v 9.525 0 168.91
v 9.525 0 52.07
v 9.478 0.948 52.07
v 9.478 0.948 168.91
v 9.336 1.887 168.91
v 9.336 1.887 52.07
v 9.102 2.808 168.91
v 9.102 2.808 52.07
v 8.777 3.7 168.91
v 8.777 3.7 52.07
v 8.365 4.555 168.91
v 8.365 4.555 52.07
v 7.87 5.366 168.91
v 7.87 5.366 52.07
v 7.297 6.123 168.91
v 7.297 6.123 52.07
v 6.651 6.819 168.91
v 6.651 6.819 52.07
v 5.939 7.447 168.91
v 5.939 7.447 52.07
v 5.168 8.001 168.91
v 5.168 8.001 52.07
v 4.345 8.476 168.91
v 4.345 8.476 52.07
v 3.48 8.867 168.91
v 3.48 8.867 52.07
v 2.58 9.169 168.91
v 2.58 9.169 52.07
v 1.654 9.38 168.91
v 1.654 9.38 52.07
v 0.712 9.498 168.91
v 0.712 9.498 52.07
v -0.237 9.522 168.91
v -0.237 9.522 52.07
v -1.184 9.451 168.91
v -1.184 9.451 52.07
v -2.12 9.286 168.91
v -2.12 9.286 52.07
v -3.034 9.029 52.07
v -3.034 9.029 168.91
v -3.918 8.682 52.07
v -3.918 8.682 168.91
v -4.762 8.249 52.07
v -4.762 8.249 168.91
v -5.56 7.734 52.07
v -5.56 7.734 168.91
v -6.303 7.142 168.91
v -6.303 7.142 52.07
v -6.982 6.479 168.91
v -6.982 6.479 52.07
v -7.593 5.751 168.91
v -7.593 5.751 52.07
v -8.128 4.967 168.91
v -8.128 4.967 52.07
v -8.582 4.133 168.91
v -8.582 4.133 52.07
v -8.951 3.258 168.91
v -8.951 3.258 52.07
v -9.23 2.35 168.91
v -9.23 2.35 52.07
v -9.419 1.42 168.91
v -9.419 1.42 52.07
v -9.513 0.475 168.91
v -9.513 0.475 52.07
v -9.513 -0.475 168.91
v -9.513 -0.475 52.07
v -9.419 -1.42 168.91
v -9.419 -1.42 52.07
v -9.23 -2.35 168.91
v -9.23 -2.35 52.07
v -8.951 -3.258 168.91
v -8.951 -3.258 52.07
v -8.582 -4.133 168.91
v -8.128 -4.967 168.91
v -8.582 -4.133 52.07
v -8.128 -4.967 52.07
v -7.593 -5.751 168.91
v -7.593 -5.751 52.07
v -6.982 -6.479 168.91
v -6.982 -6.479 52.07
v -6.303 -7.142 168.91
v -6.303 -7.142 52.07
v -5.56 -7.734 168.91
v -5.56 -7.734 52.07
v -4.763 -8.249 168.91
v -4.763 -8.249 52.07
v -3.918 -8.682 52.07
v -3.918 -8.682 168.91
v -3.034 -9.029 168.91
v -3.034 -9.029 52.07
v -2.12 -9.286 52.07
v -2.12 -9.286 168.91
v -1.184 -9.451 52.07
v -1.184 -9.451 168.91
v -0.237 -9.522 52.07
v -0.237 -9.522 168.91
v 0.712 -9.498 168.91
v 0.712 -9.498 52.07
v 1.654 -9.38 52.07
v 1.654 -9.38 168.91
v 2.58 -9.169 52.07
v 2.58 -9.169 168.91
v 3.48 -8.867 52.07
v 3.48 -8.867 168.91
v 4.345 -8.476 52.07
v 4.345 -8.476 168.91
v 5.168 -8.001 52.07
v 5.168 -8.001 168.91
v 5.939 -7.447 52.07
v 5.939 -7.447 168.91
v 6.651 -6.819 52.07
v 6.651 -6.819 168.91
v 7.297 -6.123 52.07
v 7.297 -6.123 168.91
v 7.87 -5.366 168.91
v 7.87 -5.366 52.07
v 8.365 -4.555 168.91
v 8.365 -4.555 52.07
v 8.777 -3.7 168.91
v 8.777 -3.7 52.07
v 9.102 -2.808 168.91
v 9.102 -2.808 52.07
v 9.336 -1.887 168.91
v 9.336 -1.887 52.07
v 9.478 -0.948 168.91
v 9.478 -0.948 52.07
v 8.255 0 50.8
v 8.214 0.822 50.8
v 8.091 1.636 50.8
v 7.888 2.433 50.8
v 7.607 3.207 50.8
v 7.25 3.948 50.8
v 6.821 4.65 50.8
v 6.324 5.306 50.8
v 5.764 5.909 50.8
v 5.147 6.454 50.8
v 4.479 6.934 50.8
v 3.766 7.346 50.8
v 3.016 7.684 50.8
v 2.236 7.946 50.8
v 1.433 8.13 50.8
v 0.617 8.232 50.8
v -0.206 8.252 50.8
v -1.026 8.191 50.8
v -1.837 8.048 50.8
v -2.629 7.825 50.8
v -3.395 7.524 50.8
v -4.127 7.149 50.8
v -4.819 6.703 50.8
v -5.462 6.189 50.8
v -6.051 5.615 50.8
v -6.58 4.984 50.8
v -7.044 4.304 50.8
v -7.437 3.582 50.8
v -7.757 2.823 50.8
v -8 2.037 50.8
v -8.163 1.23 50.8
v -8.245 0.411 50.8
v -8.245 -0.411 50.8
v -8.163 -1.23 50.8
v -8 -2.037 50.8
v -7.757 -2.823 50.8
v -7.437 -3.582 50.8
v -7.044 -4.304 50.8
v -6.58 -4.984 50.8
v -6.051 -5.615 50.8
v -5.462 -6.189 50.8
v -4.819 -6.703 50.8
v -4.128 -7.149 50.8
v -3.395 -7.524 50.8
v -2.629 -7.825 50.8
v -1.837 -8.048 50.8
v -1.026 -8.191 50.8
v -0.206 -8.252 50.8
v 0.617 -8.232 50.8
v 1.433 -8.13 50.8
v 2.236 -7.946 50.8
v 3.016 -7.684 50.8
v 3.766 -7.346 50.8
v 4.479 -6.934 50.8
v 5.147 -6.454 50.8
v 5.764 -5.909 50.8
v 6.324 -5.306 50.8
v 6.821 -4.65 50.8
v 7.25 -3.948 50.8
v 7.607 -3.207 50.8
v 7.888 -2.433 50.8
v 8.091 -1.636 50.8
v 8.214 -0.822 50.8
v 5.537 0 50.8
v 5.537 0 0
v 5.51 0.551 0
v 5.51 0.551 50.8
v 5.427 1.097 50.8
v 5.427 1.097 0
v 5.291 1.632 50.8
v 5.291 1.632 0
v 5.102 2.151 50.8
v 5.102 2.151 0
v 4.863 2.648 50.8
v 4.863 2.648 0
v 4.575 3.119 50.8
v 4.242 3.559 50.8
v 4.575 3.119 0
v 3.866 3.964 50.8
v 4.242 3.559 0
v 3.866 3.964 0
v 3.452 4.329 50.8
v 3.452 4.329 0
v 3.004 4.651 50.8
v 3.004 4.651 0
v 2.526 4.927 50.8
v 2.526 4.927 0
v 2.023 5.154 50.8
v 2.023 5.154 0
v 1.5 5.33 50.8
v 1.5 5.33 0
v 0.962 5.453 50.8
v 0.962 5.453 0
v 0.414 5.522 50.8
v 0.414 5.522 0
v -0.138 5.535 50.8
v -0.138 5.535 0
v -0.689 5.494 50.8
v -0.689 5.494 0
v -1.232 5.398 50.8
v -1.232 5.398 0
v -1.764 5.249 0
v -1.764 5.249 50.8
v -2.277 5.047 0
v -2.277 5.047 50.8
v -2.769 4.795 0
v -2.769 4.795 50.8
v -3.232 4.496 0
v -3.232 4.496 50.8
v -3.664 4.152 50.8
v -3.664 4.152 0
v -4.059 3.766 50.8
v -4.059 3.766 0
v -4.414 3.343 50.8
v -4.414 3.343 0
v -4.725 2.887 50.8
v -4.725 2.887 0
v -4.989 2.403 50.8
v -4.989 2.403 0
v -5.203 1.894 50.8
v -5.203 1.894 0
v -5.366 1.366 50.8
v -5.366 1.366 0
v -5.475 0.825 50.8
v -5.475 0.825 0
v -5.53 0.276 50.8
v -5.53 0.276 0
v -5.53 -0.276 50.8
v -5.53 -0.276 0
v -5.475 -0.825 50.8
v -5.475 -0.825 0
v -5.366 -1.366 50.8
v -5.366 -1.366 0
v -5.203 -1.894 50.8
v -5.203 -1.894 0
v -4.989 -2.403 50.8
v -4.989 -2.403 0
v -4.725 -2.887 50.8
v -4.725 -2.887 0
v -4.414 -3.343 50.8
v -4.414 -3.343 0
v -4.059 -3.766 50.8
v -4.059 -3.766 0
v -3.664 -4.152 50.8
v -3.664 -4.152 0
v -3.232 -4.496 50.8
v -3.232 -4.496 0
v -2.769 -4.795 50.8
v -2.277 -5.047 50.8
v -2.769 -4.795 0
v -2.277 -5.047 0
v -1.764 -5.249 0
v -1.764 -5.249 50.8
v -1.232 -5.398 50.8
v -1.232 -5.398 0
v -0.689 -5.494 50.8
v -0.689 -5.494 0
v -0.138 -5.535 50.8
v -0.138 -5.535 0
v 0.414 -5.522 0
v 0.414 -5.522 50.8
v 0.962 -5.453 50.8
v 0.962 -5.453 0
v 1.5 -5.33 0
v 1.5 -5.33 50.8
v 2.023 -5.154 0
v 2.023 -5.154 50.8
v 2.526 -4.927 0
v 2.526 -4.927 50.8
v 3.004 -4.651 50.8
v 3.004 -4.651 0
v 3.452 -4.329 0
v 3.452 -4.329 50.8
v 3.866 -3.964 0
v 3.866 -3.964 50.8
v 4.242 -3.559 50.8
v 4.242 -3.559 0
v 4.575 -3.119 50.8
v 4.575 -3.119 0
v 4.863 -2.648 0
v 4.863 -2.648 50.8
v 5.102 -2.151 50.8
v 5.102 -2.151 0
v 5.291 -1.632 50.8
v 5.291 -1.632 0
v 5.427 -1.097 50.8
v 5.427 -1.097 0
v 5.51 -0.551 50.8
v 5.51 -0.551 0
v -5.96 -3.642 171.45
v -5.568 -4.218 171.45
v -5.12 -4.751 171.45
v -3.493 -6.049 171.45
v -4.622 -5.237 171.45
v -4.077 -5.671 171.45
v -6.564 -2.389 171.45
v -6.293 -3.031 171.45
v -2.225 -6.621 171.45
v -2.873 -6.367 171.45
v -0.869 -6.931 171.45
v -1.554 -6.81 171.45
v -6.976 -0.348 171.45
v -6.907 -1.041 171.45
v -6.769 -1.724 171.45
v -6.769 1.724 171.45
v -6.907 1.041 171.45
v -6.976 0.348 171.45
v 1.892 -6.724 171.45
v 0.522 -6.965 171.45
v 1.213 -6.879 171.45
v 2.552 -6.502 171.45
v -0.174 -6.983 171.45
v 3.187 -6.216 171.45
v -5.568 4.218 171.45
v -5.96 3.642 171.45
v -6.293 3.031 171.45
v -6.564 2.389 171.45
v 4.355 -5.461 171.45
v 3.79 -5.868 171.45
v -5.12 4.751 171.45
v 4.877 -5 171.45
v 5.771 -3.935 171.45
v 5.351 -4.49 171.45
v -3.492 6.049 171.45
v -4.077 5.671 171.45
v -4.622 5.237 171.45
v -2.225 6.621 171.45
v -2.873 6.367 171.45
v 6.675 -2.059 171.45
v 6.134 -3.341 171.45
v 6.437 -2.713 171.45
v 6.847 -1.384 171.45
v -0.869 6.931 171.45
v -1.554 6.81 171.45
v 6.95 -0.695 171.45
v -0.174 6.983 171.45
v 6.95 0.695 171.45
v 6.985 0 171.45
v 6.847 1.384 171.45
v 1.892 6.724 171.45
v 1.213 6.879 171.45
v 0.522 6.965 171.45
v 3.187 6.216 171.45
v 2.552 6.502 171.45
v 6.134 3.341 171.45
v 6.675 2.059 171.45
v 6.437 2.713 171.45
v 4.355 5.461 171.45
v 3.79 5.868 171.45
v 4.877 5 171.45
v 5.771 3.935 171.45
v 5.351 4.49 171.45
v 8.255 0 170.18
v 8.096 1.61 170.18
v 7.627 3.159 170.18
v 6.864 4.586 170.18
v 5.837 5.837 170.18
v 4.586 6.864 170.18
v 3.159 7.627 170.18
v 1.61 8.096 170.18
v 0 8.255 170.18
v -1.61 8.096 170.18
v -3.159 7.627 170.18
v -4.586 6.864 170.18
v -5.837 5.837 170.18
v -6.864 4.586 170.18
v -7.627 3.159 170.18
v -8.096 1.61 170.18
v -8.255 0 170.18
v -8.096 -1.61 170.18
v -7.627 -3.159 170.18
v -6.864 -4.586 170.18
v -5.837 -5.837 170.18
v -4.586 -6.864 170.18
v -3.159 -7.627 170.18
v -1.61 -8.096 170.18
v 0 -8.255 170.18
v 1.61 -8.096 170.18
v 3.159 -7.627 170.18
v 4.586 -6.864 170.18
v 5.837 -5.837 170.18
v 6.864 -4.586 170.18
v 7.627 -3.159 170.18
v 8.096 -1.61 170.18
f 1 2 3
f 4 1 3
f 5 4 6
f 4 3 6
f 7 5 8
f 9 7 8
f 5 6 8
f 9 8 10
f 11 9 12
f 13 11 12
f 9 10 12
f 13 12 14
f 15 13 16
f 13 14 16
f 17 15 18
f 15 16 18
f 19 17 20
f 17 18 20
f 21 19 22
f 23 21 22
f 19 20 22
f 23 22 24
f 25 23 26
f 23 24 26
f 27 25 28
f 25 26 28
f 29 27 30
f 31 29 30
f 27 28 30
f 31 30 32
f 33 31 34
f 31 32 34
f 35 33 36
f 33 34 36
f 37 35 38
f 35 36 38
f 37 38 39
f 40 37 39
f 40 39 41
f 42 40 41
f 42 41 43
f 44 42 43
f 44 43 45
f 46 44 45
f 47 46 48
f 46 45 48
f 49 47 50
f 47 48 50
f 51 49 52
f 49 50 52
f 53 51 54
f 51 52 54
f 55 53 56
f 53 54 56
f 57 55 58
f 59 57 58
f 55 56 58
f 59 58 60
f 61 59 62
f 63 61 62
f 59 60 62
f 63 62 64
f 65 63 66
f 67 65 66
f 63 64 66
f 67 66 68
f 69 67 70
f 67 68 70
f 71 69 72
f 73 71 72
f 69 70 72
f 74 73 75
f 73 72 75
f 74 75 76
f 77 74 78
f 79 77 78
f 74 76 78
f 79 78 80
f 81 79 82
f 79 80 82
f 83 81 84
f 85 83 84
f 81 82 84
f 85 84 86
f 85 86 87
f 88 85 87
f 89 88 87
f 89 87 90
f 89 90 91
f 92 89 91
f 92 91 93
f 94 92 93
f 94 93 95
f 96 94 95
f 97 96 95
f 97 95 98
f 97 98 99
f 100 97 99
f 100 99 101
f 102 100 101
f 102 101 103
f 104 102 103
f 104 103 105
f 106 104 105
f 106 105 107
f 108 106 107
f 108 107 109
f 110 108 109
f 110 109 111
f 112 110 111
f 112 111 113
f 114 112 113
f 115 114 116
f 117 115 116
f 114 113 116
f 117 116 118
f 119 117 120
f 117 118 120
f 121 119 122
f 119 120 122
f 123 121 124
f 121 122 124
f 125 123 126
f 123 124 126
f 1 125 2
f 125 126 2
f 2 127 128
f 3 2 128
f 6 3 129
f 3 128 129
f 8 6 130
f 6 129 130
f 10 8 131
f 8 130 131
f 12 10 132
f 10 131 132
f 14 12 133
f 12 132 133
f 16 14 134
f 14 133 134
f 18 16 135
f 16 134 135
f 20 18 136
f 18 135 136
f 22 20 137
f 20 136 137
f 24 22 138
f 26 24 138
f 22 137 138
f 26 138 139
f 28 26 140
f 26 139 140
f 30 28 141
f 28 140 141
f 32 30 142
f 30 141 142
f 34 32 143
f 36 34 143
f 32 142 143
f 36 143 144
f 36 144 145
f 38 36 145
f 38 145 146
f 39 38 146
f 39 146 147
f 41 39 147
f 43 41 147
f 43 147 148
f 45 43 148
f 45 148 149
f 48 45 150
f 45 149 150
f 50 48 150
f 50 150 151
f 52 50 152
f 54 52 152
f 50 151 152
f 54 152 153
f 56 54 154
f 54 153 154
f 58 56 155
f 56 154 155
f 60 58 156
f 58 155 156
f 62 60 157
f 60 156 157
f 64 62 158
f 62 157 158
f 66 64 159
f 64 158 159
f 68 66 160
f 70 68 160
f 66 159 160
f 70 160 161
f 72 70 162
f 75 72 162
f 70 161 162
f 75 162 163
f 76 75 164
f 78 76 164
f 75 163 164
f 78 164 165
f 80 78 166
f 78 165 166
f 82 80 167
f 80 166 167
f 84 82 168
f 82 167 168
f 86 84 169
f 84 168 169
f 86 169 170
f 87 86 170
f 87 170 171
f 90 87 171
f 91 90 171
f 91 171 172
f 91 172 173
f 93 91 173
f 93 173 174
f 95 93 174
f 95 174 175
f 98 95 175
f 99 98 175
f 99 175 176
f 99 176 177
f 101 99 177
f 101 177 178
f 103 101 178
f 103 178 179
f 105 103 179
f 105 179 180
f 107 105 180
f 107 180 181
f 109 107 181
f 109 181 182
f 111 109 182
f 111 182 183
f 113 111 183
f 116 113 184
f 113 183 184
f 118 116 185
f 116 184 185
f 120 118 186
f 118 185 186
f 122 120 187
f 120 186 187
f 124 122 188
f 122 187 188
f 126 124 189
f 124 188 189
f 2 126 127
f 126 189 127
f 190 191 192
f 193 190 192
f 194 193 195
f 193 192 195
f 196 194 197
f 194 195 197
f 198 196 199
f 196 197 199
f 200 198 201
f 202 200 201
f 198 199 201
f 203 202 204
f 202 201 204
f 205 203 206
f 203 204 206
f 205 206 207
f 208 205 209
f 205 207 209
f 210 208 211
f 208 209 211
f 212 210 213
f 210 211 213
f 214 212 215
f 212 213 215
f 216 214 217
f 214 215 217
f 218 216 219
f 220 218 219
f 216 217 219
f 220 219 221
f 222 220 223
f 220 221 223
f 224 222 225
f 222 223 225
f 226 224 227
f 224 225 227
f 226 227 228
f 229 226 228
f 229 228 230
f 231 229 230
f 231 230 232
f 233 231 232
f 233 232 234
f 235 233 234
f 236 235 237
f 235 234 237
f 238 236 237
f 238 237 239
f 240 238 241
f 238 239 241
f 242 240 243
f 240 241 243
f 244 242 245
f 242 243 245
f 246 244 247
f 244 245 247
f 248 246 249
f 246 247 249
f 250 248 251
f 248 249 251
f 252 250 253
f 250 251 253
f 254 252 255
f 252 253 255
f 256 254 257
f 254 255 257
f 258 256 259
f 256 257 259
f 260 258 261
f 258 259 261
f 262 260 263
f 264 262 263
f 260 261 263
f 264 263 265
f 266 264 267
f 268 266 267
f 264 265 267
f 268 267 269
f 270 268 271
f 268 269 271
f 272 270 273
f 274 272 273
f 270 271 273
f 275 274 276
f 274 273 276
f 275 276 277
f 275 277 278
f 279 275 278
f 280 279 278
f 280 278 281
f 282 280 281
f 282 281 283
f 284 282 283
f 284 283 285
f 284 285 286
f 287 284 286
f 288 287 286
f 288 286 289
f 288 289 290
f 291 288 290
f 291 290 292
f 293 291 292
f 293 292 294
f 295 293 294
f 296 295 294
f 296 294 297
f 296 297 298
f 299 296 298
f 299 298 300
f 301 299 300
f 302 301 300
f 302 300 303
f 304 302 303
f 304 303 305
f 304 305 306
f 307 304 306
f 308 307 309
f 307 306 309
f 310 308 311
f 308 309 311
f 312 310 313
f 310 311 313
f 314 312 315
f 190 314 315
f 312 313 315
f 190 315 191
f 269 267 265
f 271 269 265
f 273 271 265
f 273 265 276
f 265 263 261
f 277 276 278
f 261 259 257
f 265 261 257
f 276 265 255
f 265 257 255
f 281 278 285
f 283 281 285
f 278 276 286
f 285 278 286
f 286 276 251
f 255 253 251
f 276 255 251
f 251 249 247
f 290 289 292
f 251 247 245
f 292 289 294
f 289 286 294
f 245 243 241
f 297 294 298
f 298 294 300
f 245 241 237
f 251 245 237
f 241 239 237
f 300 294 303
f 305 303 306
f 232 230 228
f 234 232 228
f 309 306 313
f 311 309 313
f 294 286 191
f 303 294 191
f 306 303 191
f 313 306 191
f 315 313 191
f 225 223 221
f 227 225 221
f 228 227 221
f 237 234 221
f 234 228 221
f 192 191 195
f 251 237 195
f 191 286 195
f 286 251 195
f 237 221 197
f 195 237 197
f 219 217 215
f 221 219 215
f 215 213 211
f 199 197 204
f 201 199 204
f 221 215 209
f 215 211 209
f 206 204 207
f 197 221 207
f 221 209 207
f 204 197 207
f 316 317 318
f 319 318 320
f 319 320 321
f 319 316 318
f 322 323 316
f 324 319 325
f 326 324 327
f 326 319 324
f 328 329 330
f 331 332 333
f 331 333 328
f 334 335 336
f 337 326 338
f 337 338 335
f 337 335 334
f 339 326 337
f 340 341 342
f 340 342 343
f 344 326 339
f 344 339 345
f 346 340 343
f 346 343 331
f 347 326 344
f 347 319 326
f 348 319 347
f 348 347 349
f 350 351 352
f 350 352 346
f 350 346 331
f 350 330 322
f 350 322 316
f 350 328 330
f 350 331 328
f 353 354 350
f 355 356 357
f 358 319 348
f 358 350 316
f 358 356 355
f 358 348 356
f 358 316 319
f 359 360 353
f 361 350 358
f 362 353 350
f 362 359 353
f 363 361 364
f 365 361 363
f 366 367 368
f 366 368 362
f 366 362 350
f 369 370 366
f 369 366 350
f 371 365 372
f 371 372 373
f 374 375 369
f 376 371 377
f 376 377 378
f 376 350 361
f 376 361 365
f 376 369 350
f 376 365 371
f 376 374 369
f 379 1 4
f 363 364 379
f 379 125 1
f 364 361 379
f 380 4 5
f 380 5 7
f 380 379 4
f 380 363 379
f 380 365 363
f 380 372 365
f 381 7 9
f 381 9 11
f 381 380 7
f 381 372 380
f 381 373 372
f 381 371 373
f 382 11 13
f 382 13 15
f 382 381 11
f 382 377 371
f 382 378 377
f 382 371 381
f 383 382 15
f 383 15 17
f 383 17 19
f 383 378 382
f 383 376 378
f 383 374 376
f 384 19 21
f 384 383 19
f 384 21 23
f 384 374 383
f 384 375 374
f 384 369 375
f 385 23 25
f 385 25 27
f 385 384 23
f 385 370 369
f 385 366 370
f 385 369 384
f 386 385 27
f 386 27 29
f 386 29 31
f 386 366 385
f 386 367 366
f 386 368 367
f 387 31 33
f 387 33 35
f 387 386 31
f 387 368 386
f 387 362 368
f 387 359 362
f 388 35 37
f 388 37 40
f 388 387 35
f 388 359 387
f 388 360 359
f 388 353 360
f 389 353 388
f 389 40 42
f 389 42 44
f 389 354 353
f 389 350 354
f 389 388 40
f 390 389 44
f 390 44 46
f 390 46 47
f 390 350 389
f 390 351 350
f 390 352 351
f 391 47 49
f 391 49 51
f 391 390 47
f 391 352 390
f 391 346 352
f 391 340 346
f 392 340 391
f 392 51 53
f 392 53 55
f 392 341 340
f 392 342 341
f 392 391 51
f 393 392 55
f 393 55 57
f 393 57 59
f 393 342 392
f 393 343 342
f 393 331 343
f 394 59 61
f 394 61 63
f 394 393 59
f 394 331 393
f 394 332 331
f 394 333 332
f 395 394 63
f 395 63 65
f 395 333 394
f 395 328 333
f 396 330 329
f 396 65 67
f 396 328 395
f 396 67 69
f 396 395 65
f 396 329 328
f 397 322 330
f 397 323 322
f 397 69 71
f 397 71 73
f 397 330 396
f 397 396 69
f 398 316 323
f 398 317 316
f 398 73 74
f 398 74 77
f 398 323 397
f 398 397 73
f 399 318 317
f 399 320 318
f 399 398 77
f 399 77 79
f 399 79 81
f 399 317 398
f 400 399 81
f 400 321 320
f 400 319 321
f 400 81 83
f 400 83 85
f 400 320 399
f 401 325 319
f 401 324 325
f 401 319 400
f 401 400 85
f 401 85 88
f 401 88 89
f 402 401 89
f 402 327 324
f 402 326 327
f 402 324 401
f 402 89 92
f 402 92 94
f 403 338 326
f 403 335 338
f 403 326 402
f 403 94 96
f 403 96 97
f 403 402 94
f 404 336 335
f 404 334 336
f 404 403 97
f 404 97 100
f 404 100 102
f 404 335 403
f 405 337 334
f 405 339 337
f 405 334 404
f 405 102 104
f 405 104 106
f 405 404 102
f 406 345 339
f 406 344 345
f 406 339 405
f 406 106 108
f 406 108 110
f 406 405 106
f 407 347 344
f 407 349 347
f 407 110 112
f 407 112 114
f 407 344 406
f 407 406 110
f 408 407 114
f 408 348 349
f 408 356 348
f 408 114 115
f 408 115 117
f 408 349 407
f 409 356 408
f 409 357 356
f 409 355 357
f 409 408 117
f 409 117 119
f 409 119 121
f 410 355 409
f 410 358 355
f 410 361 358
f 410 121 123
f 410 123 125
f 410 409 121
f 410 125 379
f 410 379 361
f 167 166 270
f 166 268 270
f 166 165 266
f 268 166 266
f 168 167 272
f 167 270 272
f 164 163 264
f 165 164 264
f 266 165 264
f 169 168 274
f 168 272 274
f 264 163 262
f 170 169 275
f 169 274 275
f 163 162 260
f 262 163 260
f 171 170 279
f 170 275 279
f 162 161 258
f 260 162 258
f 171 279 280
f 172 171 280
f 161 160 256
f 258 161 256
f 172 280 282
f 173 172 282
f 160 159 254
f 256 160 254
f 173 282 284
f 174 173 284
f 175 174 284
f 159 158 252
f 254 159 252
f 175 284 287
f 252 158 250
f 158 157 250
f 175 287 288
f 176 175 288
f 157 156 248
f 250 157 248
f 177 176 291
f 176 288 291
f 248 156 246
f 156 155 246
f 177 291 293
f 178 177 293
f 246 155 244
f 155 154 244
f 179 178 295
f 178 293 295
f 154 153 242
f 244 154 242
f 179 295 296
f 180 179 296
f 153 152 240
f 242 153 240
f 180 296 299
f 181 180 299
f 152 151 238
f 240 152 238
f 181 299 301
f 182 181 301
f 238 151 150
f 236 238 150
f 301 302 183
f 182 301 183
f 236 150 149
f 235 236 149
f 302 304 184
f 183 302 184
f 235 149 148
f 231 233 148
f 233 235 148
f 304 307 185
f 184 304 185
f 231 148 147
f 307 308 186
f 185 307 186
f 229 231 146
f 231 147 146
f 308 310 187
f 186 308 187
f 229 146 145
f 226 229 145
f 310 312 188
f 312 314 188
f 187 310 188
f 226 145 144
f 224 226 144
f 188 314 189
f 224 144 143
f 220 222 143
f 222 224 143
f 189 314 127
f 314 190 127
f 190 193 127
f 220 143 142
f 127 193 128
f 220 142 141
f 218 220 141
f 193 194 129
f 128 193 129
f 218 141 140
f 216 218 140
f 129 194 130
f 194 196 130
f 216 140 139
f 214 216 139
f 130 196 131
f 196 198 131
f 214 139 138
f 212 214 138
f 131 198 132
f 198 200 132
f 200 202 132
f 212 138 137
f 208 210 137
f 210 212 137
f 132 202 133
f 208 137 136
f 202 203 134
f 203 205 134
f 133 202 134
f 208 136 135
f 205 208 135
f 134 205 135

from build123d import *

# Parameters (mm, degrees)
F0_R     = 5.5372
F1_DEPTH = 50.8
F2_R     = 9.525
F3_DEPTH = 120.65
F4_SIZE  = 2.54
F5_SIZE  = 1.27


with BuildPart() as f1:
    # F0 (on Top) → F1 (new body)
    with BuildSketch(Plane.XY):
        Circle(F0_R)
    extrude(amount=F1_DEPTH)

    # F2 (on face) → F3 (join)
    with BuildSketch(Plane.XY.offset(50.8)):
        Circle(F2_R)
    extrude(amount=F3_DEPTH)

    # F4
    f4_edges = [f1.edges().sort_by_distance(p)[0] for p in [
        (-9.525, 0, 171.45),
    ]]
    chamfer(f4_edges, length=F4_SIZE)

    # F5
    f5_edges = [f1.edges().sort_by_distance(p)[0] for p in [
        (-9.525, 0, 50.8),
    ]]
    chamfer(f5_edges, length=F5_SIZE)


solid = f1.part
